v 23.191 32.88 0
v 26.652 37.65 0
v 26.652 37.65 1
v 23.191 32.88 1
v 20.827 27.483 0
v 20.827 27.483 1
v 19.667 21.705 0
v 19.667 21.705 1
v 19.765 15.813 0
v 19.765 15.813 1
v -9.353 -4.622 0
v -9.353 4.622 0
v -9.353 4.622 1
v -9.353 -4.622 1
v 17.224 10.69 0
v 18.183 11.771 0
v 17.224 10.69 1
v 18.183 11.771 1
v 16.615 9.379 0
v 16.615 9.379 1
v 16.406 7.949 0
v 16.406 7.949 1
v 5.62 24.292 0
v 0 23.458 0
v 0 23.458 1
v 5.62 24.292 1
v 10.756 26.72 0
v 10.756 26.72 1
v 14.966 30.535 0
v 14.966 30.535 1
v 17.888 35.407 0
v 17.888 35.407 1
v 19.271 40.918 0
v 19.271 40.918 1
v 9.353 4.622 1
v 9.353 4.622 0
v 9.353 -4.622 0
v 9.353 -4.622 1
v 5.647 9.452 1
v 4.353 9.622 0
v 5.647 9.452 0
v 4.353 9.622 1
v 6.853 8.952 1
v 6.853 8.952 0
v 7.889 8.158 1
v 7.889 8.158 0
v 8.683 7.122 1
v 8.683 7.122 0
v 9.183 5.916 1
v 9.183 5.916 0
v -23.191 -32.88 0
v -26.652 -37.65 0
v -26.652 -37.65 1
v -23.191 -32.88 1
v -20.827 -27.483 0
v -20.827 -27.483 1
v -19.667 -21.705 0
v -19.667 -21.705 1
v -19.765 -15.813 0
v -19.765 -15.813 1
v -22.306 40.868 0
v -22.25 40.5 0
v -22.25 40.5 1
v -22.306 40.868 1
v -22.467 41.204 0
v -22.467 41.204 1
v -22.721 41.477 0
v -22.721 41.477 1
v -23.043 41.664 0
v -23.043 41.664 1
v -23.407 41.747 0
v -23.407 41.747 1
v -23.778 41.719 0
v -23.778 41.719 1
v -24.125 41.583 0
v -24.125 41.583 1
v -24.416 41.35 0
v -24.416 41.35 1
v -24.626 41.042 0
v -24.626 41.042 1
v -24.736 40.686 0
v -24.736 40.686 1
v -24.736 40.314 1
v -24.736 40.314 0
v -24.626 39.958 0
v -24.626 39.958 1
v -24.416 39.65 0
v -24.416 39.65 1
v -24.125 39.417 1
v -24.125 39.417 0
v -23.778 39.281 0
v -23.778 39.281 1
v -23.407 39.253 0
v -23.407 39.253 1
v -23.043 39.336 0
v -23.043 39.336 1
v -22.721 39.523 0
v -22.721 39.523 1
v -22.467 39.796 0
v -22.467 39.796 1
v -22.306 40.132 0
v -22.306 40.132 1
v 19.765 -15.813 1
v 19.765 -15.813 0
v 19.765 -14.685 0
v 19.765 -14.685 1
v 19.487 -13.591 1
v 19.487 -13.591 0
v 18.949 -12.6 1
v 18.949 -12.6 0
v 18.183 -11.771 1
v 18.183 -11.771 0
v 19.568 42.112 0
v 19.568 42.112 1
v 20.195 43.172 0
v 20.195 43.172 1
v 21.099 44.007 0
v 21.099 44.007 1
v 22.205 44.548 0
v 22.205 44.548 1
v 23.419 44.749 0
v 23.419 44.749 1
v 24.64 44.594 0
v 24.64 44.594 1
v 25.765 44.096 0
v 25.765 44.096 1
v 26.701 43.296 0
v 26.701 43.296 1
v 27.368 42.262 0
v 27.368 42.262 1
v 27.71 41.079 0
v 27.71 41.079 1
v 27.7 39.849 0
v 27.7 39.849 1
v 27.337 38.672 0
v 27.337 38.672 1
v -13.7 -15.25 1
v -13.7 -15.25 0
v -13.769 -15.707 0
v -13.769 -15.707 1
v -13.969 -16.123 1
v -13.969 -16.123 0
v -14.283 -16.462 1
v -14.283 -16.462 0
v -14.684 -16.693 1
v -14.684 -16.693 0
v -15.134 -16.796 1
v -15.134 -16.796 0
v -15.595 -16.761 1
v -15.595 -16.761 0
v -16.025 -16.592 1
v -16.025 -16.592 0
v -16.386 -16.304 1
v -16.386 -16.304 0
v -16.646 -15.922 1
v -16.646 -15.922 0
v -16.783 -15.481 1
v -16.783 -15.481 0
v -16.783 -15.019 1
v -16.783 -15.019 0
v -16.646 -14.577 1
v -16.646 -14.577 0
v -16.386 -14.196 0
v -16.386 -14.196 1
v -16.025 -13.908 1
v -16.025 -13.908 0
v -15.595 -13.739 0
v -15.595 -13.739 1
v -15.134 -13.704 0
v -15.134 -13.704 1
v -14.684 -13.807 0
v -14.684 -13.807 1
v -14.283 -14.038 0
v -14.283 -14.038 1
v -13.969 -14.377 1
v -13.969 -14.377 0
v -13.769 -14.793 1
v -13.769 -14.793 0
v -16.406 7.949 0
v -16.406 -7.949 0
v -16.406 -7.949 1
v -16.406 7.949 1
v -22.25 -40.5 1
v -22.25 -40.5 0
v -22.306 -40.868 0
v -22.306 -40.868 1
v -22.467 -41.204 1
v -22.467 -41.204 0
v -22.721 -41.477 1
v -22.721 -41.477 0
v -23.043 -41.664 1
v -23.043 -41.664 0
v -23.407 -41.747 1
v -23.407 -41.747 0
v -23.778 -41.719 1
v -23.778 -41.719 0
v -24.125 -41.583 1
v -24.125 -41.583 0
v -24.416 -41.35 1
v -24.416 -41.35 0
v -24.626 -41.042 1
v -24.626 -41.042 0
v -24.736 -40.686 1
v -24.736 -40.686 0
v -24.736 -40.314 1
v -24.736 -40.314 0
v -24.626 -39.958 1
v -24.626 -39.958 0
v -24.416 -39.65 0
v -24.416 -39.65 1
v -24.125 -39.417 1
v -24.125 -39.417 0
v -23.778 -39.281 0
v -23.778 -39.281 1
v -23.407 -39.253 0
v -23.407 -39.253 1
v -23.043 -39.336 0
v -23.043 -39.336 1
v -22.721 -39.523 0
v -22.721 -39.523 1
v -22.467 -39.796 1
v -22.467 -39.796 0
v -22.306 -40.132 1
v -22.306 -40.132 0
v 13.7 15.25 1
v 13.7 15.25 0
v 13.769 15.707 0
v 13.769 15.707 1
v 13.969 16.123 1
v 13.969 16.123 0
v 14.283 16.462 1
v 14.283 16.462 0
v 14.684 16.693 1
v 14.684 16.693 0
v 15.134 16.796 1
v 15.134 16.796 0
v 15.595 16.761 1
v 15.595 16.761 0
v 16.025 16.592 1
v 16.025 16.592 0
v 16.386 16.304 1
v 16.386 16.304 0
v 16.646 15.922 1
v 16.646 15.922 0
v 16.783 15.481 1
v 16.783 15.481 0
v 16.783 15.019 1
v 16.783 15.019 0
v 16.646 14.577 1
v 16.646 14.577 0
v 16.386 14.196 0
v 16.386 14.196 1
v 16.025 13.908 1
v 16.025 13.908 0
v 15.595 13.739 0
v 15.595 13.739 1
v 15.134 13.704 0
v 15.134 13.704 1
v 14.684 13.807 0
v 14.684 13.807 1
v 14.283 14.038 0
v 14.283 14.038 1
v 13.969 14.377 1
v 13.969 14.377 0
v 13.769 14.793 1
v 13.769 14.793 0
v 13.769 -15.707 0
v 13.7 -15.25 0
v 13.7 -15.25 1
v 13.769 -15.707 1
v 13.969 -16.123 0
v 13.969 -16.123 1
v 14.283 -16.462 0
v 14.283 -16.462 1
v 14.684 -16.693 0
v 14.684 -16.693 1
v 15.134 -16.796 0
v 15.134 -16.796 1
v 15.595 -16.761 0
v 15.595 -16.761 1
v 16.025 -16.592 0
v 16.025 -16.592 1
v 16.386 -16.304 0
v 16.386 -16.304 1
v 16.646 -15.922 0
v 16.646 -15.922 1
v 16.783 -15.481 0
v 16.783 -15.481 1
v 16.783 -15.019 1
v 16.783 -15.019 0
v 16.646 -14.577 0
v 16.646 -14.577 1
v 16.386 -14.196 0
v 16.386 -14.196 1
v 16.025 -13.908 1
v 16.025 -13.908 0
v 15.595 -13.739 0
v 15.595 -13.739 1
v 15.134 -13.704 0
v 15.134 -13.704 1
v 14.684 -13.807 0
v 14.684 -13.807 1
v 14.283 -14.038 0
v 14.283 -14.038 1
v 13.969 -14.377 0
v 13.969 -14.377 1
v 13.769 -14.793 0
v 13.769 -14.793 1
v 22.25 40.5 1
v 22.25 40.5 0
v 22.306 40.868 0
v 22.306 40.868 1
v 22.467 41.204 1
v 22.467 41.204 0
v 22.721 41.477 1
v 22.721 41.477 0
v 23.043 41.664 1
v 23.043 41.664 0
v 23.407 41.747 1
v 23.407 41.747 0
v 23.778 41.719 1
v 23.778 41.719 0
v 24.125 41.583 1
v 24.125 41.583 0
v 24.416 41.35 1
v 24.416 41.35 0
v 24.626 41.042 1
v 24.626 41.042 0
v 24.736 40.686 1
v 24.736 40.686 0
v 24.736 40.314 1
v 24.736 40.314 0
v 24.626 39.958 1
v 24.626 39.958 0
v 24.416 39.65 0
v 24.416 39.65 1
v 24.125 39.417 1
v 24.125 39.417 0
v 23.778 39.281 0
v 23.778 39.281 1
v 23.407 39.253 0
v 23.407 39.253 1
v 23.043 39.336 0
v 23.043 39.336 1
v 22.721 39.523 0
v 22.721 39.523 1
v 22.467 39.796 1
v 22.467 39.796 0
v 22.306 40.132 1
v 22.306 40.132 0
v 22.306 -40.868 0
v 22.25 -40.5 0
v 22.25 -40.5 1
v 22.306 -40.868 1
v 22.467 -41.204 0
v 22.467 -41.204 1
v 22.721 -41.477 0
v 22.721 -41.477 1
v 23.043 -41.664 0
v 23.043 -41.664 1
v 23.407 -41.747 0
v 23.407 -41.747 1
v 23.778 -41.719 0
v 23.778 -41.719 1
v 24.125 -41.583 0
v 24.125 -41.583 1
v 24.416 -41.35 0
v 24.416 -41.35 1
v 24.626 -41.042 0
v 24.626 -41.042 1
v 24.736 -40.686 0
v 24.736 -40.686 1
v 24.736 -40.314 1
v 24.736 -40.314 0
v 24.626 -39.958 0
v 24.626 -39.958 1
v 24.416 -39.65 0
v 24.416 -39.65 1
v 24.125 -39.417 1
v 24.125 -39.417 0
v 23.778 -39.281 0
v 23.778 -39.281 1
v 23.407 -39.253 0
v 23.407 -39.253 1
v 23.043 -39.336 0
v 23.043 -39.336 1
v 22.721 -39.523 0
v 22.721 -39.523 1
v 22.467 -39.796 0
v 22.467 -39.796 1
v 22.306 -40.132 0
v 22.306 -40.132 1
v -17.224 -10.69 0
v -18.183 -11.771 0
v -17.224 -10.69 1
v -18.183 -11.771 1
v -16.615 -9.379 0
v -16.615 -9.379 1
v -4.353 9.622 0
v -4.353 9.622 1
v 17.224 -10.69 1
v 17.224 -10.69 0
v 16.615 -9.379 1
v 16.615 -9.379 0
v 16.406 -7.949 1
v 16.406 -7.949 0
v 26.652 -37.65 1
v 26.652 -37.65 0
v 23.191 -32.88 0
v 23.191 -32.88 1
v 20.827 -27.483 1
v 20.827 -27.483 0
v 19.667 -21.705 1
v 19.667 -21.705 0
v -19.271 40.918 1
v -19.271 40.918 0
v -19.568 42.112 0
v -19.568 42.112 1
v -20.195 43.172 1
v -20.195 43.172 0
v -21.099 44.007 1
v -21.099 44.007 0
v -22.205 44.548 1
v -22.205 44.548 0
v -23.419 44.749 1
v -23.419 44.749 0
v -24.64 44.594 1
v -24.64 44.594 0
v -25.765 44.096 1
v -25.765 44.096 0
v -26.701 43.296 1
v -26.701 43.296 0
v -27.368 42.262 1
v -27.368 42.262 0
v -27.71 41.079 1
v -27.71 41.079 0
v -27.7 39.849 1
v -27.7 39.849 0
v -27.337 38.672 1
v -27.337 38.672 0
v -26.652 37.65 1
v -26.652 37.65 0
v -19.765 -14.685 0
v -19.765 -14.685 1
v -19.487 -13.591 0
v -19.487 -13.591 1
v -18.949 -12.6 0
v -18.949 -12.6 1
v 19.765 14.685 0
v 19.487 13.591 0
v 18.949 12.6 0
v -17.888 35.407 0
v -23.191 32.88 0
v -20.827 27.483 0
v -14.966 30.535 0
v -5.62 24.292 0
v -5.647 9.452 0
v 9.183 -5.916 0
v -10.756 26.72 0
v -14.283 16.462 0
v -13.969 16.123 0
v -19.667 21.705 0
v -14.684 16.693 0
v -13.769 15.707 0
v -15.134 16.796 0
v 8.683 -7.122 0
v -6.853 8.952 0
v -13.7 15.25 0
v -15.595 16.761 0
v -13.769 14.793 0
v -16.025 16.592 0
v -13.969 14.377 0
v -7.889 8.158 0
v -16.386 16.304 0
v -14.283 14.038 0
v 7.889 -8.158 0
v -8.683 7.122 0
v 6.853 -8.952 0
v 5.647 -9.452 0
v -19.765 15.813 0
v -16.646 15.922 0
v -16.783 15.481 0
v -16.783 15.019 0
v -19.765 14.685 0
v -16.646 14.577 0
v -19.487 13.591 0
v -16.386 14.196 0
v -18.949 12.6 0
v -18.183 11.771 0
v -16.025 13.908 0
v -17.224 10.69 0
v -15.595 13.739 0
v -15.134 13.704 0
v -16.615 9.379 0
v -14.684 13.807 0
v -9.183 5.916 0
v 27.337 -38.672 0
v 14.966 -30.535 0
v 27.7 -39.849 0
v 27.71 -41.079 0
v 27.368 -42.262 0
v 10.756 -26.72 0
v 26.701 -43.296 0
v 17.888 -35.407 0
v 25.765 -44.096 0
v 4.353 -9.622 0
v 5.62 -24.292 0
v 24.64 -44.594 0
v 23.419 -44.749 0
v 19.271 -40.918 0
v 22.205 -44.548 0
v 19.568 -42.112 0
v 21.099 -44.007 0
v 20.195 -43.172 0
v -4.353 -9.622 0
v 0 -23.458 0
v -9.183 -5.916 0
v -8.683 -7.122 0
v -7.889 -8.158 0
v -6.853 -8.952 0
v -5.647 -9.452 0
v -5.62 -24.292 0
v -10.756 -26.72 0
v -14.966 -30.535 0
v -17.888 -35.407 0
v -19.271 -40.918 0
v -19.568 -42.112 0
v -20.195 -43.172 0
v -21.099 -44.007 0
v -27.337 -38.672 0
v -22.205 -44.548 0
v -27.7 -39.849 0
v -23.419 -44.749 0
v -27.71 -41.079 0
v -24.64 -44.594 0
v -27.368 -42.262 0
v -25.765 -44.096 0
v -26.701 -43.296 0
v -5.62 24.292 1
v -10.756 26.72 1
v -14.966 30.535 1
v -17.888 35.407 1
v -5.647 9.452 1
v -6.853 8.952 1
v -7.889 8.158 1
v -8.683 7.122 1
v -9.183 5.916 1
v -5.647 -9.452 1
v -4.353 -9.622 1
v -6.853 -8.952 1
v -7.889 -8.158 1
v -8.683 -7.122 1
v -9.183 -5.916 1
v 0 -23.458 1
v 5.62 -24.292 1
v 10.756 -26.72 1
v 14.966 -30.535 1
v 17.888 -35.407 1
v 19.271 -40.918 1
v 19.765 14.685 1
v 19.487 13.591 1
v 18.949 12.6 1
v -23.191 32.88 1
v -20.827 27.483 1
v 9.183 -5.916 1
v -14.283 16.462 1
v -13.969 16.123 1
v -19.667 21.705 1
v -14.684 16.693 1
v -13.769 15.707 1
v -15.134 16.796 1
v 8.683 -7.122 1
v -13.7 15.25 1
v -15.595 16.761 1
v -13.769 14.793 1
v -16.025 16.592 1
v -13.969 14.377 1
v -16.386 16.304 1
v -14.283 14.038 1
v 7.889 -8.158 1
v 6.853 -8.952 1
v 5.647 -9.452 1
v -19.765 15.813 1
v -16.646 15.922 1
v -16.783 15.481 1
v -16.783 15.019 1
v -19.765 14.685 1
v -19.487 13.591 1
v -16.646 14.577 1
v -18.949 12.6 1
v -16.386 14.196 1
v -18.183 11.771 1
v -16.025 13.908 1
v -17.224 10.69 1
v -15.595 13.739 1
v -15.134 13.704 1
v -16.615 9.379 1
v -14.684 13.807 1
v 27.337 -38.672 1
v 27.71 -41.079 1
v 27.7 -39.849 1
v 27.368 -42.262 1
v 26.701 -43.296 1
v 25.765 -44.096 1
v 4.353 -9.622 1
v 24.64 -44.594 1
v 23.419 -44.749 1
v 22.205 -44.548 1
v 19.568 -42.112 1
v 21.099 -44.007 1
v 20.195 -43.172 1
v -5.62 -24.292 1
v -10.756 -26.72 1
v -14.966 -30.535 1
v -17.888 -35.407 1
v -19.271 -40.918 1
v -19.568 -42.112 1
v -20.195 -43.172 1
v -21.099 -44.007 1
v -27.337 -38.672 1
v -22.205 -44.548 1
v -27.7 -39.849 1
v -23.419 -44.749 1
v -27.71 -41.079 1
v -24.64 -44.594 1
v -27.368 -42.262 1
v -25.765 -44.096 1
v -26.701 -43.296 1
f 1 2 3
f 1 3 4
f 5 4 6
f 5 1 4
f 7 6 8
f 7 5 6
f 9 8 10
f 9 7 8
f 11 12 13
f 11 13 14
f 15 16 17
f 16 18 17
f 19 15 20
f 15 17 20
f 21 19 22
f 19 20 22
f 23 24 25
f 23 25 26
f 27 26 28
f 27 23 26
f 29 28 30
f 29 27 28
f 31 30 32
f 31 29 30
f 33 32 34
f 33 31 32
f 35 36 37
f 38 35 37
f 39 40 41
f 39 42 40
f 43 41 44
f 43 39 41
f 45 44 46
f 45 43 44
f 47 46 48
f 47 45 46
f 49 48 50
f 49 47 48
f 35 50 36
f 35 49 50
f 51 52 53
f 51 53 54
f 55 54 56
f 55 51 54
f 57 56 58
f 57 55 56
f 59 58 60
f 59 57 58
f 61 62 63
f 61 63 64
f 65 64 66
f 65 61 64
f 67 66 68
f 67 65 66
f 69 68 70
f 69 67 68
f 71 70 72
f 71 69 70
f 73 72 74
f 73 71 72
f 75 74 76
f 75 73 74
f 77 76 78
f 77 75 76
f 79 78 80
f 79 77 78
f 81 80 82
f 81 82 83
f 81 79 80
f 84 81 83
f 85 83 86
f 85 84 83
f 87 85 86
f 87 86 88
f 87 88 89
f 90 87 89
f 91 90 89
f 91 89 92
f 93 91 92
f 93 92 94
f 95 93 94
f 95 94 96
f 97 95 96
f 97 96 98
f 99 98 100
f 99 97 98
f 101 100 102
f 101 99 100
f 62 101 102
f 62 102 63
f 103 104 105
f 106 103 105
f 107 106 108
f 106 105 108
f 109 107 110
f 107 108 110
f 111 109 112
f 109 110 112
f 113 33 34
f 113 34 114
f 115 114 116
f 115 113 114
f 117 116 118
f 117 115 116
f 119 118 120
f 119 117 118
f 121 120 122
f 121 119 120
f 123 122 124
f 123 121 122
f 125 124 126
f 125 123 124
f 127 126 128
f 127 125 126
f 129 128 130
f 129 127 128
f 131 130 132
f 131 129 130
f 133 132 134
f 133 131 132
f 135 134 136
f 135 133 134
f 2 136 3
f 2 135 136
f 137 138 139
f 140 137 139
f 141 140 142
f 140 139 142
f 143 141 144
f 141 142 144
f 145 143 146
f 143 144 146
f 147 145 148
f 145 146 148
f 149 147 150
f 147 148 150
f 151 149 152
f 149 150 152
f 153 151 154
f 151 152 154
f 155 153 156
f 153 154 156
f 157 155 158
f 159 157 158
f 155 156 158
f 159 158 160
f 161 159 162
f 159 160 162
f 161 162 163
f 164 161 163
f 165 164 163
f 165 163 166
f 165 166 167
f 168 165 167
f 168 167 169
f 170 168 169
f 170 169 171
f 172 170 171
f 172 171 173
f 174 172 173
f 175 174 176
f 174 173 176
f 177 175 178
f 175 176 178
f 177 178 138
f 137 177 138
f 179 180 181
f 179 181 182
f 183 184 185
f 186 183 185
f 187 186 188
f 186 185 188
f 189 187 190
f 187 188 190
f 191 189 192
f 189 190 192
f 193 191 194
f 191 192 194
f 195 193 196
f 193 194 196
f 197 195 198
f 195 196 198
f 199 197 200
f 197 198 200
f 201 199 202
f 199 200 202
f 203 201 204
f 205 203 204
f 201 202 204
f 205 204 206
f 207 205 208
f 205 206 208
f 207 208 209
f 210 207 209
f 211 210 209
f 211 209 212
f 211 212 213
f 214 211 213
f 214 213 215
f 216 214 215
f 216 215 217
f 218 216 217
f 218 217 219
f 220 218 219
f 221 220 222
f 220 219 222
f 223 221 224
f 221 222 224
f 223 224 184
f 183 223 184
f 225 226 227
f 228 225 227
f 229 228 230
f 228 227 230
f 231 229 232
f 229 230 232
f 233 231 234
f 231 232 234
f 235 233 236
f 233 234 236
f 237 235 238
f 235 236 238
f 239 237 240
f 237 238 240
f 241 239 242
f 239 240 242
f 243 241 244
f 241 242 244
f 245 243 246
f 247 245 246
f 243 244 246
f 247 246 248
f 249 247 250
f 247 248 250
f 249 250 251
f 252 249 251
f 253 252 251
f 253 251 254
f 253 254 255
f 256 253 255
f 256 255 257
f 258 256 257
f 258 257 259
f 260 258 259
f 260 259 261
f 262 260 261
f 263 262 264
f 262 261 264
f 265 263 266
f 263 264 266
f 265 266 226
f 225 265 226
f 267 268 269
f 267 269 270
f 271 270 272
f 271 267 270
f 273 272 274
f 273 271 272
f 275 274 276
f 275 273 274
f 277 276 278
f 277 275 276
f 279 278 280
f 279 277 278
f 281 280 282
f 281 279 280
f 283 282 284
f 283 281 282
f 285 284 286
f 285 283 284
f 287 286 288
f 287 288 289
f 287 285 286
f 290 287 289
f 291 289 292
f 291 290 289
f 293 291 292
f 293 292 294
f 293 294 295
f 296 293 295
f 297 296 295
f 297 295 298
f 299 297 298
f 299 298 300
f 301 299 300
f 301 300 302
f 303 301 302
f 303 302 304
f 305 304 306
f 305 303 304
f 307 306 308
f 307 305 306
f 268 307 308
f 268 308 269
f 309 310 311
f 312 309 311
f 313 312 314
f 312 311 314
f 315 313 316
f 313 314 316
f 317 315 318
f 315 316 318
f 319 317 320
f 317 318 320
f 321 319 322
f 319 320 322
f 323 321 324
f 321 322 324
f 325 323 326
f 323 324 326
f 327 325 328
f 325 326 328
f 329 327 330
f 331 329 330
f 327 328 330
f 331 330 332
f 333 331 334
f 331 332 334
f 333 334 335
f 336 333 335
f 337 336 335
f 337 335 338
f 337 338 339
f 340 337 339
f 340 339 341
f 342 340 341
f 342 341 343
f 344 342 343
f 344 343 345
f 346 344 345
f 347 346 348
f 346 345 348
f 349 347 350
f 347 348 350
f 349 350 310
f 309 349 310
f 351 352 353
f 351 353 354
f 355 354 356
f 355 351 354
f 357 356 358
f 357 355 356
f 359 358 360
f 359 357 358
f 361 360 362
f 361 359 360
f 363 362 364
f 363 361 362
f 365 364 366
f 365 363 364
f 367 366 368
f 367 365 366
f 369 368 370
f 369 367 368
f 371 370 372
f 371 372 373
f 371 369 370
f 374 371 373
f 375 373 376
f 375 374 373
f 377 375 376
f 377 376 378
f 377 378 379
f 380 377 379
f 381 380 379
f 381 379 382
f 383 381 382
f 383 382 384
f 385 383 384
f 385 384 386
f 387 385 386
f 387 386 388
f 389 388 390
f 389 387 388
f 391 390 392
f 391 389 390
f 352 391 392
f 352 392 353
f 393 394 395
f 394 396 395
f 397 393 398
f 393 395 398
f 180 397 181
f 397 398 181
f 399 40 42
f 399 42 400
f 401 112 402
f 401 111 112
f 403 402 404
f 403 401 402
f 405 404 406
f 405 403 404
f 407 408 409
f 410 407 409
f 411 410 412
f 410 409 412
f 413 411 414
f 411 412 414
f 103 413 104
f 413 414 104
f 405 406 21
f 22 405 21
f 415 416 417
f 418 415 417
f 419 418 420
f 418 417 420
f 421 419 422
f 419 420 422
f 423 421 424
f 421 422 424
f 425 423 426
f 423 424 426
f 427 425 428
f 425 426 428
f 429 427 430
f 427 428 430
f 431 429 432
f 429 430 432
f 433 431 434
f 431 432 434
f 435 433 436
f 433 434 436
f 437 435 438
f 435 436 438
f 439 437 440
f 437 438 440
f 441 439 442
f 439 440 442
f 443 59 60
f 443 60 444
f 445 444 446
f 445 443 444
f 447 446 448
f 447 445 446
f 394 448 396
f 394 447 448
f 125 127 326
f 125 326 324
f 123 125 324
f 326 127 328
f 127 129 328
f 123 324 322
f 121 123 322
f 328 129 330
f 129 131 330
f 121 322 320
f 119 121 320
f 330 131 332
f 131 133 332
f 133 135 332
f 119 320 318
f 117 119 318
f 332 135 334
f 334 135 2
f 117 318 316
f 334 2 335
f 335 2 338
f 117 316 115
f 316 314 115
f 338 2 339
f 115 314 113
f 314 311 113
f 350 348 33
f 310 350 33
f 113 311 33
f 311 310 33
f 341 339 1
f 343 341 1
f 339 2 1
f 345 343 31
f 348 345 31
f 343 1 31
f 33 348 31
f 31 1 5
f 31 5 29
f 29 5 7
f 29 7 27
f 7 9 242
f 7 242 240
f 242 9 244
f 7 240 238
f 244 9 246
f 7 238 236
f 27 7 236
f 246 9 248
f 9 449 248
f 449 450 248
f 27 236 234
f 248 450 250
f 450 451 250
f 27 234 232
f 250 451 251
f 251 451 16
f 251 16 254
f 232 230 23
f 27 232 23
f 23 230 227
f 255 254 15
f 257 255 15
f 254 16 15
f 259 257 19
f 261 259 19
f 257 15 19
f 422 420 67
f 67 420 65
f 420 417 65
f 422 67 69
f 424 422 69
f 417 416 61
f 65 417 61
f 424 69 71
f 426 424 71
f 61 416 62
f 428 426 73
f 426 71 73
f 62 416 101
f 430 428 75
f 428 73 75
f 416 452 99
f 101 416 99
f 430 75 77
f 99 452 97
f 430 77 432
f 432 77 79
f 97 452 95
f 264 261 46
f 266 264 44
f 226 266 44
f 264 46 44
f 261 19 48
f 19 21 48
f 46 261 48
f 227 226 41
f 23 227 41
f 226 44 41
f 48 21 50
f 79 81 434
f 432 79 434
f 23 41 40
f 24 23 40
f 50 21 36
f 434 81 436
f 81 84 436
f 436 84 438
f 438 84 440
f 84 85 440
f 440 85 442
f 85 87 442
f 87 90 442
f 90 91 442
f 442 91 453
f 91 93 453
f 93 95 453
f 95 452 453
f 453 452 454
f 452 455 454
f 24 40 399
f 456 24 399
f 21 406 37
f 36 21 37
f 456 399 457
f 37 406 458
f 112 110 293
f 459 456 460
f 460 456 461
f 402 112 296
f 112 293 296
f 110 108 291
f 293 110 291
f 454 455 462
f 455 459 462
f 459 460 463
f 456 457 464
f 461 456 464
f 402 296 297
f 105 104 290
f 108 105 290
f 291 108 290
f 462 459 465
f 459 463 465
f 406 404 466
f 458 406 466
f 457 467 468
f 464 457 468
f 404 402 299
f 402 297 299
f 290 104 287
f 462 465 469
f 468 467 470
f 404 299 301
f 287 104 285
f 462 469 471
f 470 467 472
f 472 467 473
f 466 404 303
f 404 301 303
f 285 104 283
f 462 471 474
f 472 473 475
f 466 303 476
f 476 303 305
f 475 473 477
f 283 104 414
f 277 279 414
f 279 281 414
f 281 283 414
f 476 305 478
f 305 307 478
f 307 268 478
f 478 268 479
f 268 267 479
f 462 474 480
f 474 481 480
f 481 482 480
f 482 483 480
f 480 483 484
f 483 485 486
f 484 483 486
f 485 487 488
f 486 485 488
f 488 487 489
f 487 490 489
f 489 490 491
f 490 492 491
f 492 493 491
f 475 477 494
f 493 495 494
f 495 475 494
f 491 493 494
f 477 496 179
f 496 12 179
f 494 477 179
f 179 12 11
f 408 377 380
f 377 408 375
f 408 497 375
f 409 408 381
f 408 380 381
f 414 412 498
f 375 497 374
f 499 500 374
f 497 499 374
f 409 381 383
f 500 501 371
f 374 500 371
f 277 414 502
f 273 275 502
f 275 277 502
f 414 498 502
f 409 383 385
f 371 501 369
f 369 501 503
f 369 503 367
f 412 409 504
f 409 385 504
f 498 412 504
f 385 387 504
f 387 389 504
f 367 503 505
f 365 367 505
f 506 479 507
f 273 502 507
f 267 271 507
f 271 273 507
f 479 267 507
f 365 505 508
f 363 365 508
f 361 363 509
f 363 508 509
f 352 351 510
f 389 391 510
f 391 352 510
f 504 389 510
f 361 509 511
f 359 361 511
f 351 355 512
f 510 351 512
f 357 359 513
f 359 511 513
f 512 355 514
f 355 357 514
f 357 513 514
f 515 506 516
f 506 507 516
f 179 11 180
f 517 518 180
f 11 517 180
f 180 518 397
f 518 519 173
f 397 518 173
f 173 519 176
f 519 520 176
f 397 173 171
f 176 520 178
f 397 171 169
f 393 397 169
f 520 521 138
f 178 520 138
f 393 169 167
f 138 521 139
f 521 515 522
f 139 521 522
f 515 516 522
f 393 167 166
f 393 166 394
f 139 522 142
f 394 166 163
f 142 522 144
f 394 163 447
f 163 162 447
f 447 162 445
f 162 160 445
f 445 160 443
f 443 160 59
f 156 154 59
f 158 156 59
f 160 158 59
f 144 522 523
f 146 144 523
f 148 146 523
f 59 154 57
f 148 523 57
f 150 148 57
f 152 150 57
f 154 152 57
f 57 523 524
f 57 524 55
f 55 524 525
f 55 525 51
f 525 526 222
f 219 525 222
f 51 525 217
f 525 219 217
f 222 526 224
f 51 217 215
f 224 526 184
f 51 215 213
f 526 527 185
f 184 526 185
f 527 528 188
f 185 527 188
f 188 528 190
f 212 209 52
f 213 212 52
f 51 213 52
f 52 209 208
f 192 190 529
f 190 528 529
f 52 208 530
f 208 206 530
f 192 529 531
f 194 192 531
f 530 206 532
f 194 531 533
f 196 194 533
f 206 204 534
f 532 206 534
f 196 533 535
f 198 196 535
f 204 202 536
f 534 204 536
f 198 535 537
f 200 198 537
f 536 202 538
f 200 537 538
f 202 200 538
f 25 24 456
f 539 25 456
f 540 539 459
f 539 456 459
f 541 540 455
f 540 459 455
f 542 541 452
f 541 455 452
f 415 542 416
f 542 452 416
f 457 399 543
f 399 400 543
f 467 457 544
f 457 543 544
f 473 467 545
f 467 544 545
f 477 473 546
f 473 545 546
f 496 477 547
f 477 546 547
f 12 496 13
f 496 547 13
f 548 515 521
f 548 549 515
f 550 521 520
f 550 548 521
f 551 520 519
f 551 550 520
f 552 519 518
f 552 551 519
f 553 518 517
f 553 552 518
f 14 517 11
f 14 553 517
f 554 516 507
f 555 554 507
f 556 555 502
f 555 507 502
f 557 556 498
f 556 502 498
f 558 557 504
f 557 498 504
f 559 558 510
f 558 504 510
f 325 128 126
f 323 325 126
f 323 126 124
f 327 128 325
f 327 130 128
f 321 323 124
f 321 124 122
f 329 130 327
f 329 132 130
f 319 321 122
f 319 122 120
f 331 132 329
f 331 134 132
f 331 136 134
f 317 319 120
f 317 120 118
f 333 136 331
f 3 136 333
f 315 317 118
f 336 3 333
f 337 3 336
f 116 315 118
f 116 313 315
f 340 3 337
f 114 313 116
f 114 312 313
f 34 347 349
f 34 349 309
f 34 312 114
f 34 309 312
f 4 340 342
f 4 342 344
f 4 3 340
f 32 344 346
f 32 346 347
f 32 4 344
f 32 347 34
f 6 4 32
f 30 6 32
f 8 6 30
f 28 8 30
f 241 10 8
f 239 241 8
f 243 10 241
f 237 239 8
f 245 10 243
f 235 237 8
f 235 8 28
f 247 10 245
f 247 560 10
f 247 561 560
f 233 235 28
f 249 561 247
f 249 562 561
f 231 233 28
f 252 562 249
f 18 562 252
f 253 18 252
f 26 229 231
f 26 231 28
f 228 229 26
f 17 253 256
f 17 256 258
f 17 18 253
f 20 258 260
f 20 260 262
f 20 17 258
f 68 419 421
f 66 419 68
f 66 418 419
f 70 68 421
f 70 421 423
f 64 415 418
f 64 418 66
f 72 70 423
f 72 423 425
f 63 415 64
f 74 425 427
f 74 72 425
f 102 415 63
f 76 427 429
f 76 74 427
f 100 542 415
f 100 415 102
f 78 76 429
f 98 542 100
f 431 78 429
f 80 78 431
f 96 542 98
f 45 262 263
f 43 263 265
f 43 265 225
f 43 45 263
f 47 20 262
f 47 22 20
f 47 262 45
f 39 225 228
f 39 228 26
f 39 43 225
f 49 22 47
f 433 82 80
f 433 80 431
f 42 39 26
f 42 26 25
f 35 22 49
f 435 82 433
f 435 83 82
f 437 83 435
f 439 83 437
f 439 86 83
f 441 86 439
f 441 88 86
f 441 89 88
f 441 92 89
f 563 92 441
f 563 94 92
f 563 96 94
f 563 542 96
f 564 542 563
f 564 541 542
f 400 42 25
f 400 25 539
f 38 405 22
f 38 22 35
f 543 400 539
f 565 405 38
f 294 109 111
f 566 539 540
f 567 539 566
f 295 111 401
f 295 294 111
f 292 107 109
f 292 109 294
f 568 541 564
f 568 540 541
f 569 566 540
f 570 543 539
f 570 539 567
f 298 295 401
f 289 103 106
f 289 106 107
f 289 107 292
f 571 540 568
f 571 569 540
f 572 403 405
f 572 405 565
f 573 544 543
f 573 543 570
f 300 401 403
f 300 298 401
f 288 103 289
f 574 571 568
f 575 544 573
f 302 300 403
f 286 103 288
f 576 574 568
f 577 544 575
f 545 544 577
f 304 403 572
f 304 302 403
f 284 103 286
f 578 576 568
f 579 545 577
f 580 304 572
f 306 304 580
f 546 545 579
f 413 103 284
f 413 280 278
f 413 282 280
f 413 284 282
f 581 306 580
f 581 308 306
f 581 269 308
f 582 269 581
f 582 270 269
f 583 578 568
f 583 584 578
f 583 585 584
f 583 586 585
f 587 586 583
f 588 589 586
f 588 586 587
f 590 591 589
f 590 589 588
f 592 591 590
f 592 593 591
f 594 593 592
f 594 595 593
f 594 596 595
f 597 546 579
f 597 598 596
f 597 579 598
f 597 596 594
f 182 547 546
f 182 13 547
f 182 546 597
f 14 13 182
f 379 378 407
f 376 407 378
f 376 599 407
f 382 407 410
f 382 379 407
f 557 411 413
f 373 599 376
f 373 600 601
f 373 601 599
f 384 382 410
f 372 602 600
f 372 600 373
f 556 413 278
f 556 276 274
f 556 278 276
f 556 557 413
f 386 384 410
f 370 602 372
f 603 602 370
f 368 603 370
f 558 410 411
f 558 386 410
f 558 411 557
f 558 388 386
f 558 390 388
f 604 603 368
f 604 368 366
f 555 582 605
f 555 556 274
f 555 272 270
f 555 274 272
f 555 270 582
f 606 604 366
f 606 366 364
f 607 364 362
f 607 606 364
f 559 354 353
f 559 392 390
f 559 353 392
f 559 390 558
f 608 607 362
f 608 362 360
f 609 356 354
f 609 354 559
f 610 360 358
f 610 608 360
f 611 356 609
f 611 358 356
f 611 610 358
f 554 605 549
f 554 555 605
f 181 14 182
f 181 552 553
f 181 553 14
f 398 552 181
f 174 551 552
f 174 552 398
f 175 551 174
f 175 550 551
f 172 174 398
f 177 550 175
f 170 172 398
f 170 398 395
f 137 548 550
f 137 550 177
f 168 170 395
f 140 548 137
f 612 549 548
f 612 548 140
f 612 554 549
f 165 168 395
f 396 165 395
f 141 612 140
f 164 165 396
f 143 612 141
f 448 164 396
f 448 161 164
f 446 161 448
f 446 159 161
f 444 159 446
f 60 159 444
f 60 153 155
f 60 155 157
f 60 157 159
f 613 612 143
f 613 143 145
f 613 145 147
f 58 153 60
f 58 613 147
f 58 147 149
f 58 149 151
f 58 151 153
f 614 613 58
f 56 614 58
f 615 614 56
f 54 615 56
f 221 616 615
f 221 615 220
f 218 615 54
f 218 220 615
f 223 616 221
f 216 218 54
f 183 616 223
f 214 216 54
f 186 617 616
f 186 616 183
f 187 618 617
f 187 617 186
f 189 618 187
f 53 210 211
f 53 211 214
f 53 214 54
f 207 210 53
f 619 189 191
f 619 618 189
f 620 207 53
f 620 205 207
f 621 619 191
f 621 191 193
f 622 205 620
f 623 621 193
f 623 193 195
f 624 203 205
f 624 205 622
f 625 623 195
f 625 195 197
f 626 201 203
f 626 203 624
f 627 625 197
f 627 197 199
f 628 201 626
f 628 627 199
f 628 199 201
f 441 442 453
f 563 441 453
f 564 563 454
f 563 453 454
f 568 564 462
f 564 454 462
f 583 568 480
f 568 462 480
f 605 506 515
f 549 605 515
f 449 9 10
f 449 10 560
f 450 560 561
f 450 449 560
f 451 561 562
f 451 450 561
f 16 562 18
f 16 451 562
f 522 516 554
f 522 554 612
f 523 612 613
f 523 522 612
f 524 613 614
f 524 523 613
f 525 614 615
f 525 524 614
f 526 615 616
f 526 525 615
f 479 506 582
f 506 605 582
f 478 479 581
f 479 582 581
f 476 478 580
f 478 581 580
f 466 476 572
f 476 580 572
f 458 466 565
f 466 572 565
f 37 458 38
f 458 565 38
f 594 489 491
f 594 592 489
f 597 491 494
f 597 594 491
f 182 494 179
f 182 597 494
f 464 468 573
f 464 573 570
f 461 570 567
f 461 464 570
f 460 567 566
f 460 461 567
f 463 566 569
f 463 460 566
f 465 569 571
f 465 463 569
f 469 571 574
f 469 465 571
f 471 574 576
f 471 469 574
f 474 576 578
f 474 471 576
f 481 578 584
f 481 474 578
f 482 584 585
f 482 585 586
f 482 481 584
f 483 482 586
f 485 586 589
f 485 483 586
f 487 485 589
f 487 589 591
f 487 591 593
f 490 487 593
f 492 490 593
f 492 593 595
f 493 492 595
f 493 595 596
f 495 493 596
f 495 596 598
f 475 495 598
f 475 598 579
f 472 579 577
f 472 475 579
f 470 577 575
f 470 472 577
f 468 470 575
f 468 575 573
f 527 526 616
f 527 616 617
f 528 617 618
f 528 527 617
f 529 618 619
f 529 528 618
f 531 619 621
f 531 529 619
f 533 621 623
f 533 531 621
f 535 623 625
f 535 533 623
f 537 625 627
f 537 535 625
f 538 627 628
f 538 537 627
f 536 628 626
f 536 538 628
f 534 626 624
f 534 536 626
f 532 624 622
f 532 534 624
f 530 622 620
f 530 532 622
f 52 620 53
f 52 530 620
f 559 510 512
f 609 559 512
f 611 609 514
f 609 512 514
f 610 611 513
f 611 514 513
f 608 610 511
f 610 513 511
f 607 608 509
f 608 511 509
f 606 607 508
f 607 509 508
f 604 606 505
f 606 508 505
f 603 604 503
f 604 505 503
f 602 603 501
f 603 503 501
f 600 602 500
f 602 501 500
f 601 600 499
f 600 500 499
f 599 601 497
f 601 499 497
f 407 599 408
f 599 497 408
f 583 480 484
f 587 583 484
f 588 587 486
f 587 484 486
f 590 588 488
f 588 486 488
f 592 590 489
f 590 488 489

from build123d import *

# Parameters (mm, degrees)
F0_R     = 1.55
F0_R_2   = 1.25
F1_DEPTH = 1
F2_R     = 5


with BuildPart() as f1:
    # F0 (on Top) → F1 (new body)
    with BuildSketch(Plane.XY):
        with BuildLine():
            ThreePointArc((0, 23.458341), (-13.001904, 28.47242), (-19.270611, 40.918055))
            ThreePointArc((-19.270611, 40.918055), (-25.220675, 44.3861), (-26.652391, 37.649574))
            ThreePointArc((-26.652391, 37.649574), (-20.826638, 27.482582), (-19.764921, 15.812969))
            ThreePointArc((-19.764921, 15.812969), (-19.018125, 12.699808), (-16.405741, 10.849155))
            Line((-16.405741, 10.849155), (-16.405741, 0))
            Line((-16.405741, 0), (-9.353283, 0))
            Line((-9.353283, 0), (-9.353283, 9.622366))
            Line((-9.353283, 9.622366), (0, 9.622366))
            Line((0, 9.622366), (0, 23.458341))
        make_face()
        with Locations((-15.249896, 15.249896)):
            Circle(F0_R, mode=Mode.SUBTRACT)
        with Locations((-23.5, 40.5)):
            Circle(F0_R_2, mode=Mode.SUBTRACT)
    extrude(amount=F1_DEPTH)

    # F2
    f2_edges = [f1.edges().sort_by_distance(p)[0] for p in [
        (-9.353283, 9.622366, 0.5),
        (-16.405741, 10.849155, 0.5),
    ]]
    fillet(f2_edges, radius=F2_R)

    # F3: F1 across face


with BuildPart() as f1_1:
    add(f1.part)
    add(f1.part.mirror(Plane(origin=(-12.879512, 0, 0.5), x_dir=(1, 0, 0), z_dir=(0, -1, 0))))

    # F4: F1 across face


with BuildPart() as f1_2:
    add(f1_1.part)
    add(f1_1.part.mirror(Plane(origin=(0, 16.540354, 0.5), x_dir=(0, 1, 0), z_dir=(1, 0, 0))))


solid = f1_2.part
